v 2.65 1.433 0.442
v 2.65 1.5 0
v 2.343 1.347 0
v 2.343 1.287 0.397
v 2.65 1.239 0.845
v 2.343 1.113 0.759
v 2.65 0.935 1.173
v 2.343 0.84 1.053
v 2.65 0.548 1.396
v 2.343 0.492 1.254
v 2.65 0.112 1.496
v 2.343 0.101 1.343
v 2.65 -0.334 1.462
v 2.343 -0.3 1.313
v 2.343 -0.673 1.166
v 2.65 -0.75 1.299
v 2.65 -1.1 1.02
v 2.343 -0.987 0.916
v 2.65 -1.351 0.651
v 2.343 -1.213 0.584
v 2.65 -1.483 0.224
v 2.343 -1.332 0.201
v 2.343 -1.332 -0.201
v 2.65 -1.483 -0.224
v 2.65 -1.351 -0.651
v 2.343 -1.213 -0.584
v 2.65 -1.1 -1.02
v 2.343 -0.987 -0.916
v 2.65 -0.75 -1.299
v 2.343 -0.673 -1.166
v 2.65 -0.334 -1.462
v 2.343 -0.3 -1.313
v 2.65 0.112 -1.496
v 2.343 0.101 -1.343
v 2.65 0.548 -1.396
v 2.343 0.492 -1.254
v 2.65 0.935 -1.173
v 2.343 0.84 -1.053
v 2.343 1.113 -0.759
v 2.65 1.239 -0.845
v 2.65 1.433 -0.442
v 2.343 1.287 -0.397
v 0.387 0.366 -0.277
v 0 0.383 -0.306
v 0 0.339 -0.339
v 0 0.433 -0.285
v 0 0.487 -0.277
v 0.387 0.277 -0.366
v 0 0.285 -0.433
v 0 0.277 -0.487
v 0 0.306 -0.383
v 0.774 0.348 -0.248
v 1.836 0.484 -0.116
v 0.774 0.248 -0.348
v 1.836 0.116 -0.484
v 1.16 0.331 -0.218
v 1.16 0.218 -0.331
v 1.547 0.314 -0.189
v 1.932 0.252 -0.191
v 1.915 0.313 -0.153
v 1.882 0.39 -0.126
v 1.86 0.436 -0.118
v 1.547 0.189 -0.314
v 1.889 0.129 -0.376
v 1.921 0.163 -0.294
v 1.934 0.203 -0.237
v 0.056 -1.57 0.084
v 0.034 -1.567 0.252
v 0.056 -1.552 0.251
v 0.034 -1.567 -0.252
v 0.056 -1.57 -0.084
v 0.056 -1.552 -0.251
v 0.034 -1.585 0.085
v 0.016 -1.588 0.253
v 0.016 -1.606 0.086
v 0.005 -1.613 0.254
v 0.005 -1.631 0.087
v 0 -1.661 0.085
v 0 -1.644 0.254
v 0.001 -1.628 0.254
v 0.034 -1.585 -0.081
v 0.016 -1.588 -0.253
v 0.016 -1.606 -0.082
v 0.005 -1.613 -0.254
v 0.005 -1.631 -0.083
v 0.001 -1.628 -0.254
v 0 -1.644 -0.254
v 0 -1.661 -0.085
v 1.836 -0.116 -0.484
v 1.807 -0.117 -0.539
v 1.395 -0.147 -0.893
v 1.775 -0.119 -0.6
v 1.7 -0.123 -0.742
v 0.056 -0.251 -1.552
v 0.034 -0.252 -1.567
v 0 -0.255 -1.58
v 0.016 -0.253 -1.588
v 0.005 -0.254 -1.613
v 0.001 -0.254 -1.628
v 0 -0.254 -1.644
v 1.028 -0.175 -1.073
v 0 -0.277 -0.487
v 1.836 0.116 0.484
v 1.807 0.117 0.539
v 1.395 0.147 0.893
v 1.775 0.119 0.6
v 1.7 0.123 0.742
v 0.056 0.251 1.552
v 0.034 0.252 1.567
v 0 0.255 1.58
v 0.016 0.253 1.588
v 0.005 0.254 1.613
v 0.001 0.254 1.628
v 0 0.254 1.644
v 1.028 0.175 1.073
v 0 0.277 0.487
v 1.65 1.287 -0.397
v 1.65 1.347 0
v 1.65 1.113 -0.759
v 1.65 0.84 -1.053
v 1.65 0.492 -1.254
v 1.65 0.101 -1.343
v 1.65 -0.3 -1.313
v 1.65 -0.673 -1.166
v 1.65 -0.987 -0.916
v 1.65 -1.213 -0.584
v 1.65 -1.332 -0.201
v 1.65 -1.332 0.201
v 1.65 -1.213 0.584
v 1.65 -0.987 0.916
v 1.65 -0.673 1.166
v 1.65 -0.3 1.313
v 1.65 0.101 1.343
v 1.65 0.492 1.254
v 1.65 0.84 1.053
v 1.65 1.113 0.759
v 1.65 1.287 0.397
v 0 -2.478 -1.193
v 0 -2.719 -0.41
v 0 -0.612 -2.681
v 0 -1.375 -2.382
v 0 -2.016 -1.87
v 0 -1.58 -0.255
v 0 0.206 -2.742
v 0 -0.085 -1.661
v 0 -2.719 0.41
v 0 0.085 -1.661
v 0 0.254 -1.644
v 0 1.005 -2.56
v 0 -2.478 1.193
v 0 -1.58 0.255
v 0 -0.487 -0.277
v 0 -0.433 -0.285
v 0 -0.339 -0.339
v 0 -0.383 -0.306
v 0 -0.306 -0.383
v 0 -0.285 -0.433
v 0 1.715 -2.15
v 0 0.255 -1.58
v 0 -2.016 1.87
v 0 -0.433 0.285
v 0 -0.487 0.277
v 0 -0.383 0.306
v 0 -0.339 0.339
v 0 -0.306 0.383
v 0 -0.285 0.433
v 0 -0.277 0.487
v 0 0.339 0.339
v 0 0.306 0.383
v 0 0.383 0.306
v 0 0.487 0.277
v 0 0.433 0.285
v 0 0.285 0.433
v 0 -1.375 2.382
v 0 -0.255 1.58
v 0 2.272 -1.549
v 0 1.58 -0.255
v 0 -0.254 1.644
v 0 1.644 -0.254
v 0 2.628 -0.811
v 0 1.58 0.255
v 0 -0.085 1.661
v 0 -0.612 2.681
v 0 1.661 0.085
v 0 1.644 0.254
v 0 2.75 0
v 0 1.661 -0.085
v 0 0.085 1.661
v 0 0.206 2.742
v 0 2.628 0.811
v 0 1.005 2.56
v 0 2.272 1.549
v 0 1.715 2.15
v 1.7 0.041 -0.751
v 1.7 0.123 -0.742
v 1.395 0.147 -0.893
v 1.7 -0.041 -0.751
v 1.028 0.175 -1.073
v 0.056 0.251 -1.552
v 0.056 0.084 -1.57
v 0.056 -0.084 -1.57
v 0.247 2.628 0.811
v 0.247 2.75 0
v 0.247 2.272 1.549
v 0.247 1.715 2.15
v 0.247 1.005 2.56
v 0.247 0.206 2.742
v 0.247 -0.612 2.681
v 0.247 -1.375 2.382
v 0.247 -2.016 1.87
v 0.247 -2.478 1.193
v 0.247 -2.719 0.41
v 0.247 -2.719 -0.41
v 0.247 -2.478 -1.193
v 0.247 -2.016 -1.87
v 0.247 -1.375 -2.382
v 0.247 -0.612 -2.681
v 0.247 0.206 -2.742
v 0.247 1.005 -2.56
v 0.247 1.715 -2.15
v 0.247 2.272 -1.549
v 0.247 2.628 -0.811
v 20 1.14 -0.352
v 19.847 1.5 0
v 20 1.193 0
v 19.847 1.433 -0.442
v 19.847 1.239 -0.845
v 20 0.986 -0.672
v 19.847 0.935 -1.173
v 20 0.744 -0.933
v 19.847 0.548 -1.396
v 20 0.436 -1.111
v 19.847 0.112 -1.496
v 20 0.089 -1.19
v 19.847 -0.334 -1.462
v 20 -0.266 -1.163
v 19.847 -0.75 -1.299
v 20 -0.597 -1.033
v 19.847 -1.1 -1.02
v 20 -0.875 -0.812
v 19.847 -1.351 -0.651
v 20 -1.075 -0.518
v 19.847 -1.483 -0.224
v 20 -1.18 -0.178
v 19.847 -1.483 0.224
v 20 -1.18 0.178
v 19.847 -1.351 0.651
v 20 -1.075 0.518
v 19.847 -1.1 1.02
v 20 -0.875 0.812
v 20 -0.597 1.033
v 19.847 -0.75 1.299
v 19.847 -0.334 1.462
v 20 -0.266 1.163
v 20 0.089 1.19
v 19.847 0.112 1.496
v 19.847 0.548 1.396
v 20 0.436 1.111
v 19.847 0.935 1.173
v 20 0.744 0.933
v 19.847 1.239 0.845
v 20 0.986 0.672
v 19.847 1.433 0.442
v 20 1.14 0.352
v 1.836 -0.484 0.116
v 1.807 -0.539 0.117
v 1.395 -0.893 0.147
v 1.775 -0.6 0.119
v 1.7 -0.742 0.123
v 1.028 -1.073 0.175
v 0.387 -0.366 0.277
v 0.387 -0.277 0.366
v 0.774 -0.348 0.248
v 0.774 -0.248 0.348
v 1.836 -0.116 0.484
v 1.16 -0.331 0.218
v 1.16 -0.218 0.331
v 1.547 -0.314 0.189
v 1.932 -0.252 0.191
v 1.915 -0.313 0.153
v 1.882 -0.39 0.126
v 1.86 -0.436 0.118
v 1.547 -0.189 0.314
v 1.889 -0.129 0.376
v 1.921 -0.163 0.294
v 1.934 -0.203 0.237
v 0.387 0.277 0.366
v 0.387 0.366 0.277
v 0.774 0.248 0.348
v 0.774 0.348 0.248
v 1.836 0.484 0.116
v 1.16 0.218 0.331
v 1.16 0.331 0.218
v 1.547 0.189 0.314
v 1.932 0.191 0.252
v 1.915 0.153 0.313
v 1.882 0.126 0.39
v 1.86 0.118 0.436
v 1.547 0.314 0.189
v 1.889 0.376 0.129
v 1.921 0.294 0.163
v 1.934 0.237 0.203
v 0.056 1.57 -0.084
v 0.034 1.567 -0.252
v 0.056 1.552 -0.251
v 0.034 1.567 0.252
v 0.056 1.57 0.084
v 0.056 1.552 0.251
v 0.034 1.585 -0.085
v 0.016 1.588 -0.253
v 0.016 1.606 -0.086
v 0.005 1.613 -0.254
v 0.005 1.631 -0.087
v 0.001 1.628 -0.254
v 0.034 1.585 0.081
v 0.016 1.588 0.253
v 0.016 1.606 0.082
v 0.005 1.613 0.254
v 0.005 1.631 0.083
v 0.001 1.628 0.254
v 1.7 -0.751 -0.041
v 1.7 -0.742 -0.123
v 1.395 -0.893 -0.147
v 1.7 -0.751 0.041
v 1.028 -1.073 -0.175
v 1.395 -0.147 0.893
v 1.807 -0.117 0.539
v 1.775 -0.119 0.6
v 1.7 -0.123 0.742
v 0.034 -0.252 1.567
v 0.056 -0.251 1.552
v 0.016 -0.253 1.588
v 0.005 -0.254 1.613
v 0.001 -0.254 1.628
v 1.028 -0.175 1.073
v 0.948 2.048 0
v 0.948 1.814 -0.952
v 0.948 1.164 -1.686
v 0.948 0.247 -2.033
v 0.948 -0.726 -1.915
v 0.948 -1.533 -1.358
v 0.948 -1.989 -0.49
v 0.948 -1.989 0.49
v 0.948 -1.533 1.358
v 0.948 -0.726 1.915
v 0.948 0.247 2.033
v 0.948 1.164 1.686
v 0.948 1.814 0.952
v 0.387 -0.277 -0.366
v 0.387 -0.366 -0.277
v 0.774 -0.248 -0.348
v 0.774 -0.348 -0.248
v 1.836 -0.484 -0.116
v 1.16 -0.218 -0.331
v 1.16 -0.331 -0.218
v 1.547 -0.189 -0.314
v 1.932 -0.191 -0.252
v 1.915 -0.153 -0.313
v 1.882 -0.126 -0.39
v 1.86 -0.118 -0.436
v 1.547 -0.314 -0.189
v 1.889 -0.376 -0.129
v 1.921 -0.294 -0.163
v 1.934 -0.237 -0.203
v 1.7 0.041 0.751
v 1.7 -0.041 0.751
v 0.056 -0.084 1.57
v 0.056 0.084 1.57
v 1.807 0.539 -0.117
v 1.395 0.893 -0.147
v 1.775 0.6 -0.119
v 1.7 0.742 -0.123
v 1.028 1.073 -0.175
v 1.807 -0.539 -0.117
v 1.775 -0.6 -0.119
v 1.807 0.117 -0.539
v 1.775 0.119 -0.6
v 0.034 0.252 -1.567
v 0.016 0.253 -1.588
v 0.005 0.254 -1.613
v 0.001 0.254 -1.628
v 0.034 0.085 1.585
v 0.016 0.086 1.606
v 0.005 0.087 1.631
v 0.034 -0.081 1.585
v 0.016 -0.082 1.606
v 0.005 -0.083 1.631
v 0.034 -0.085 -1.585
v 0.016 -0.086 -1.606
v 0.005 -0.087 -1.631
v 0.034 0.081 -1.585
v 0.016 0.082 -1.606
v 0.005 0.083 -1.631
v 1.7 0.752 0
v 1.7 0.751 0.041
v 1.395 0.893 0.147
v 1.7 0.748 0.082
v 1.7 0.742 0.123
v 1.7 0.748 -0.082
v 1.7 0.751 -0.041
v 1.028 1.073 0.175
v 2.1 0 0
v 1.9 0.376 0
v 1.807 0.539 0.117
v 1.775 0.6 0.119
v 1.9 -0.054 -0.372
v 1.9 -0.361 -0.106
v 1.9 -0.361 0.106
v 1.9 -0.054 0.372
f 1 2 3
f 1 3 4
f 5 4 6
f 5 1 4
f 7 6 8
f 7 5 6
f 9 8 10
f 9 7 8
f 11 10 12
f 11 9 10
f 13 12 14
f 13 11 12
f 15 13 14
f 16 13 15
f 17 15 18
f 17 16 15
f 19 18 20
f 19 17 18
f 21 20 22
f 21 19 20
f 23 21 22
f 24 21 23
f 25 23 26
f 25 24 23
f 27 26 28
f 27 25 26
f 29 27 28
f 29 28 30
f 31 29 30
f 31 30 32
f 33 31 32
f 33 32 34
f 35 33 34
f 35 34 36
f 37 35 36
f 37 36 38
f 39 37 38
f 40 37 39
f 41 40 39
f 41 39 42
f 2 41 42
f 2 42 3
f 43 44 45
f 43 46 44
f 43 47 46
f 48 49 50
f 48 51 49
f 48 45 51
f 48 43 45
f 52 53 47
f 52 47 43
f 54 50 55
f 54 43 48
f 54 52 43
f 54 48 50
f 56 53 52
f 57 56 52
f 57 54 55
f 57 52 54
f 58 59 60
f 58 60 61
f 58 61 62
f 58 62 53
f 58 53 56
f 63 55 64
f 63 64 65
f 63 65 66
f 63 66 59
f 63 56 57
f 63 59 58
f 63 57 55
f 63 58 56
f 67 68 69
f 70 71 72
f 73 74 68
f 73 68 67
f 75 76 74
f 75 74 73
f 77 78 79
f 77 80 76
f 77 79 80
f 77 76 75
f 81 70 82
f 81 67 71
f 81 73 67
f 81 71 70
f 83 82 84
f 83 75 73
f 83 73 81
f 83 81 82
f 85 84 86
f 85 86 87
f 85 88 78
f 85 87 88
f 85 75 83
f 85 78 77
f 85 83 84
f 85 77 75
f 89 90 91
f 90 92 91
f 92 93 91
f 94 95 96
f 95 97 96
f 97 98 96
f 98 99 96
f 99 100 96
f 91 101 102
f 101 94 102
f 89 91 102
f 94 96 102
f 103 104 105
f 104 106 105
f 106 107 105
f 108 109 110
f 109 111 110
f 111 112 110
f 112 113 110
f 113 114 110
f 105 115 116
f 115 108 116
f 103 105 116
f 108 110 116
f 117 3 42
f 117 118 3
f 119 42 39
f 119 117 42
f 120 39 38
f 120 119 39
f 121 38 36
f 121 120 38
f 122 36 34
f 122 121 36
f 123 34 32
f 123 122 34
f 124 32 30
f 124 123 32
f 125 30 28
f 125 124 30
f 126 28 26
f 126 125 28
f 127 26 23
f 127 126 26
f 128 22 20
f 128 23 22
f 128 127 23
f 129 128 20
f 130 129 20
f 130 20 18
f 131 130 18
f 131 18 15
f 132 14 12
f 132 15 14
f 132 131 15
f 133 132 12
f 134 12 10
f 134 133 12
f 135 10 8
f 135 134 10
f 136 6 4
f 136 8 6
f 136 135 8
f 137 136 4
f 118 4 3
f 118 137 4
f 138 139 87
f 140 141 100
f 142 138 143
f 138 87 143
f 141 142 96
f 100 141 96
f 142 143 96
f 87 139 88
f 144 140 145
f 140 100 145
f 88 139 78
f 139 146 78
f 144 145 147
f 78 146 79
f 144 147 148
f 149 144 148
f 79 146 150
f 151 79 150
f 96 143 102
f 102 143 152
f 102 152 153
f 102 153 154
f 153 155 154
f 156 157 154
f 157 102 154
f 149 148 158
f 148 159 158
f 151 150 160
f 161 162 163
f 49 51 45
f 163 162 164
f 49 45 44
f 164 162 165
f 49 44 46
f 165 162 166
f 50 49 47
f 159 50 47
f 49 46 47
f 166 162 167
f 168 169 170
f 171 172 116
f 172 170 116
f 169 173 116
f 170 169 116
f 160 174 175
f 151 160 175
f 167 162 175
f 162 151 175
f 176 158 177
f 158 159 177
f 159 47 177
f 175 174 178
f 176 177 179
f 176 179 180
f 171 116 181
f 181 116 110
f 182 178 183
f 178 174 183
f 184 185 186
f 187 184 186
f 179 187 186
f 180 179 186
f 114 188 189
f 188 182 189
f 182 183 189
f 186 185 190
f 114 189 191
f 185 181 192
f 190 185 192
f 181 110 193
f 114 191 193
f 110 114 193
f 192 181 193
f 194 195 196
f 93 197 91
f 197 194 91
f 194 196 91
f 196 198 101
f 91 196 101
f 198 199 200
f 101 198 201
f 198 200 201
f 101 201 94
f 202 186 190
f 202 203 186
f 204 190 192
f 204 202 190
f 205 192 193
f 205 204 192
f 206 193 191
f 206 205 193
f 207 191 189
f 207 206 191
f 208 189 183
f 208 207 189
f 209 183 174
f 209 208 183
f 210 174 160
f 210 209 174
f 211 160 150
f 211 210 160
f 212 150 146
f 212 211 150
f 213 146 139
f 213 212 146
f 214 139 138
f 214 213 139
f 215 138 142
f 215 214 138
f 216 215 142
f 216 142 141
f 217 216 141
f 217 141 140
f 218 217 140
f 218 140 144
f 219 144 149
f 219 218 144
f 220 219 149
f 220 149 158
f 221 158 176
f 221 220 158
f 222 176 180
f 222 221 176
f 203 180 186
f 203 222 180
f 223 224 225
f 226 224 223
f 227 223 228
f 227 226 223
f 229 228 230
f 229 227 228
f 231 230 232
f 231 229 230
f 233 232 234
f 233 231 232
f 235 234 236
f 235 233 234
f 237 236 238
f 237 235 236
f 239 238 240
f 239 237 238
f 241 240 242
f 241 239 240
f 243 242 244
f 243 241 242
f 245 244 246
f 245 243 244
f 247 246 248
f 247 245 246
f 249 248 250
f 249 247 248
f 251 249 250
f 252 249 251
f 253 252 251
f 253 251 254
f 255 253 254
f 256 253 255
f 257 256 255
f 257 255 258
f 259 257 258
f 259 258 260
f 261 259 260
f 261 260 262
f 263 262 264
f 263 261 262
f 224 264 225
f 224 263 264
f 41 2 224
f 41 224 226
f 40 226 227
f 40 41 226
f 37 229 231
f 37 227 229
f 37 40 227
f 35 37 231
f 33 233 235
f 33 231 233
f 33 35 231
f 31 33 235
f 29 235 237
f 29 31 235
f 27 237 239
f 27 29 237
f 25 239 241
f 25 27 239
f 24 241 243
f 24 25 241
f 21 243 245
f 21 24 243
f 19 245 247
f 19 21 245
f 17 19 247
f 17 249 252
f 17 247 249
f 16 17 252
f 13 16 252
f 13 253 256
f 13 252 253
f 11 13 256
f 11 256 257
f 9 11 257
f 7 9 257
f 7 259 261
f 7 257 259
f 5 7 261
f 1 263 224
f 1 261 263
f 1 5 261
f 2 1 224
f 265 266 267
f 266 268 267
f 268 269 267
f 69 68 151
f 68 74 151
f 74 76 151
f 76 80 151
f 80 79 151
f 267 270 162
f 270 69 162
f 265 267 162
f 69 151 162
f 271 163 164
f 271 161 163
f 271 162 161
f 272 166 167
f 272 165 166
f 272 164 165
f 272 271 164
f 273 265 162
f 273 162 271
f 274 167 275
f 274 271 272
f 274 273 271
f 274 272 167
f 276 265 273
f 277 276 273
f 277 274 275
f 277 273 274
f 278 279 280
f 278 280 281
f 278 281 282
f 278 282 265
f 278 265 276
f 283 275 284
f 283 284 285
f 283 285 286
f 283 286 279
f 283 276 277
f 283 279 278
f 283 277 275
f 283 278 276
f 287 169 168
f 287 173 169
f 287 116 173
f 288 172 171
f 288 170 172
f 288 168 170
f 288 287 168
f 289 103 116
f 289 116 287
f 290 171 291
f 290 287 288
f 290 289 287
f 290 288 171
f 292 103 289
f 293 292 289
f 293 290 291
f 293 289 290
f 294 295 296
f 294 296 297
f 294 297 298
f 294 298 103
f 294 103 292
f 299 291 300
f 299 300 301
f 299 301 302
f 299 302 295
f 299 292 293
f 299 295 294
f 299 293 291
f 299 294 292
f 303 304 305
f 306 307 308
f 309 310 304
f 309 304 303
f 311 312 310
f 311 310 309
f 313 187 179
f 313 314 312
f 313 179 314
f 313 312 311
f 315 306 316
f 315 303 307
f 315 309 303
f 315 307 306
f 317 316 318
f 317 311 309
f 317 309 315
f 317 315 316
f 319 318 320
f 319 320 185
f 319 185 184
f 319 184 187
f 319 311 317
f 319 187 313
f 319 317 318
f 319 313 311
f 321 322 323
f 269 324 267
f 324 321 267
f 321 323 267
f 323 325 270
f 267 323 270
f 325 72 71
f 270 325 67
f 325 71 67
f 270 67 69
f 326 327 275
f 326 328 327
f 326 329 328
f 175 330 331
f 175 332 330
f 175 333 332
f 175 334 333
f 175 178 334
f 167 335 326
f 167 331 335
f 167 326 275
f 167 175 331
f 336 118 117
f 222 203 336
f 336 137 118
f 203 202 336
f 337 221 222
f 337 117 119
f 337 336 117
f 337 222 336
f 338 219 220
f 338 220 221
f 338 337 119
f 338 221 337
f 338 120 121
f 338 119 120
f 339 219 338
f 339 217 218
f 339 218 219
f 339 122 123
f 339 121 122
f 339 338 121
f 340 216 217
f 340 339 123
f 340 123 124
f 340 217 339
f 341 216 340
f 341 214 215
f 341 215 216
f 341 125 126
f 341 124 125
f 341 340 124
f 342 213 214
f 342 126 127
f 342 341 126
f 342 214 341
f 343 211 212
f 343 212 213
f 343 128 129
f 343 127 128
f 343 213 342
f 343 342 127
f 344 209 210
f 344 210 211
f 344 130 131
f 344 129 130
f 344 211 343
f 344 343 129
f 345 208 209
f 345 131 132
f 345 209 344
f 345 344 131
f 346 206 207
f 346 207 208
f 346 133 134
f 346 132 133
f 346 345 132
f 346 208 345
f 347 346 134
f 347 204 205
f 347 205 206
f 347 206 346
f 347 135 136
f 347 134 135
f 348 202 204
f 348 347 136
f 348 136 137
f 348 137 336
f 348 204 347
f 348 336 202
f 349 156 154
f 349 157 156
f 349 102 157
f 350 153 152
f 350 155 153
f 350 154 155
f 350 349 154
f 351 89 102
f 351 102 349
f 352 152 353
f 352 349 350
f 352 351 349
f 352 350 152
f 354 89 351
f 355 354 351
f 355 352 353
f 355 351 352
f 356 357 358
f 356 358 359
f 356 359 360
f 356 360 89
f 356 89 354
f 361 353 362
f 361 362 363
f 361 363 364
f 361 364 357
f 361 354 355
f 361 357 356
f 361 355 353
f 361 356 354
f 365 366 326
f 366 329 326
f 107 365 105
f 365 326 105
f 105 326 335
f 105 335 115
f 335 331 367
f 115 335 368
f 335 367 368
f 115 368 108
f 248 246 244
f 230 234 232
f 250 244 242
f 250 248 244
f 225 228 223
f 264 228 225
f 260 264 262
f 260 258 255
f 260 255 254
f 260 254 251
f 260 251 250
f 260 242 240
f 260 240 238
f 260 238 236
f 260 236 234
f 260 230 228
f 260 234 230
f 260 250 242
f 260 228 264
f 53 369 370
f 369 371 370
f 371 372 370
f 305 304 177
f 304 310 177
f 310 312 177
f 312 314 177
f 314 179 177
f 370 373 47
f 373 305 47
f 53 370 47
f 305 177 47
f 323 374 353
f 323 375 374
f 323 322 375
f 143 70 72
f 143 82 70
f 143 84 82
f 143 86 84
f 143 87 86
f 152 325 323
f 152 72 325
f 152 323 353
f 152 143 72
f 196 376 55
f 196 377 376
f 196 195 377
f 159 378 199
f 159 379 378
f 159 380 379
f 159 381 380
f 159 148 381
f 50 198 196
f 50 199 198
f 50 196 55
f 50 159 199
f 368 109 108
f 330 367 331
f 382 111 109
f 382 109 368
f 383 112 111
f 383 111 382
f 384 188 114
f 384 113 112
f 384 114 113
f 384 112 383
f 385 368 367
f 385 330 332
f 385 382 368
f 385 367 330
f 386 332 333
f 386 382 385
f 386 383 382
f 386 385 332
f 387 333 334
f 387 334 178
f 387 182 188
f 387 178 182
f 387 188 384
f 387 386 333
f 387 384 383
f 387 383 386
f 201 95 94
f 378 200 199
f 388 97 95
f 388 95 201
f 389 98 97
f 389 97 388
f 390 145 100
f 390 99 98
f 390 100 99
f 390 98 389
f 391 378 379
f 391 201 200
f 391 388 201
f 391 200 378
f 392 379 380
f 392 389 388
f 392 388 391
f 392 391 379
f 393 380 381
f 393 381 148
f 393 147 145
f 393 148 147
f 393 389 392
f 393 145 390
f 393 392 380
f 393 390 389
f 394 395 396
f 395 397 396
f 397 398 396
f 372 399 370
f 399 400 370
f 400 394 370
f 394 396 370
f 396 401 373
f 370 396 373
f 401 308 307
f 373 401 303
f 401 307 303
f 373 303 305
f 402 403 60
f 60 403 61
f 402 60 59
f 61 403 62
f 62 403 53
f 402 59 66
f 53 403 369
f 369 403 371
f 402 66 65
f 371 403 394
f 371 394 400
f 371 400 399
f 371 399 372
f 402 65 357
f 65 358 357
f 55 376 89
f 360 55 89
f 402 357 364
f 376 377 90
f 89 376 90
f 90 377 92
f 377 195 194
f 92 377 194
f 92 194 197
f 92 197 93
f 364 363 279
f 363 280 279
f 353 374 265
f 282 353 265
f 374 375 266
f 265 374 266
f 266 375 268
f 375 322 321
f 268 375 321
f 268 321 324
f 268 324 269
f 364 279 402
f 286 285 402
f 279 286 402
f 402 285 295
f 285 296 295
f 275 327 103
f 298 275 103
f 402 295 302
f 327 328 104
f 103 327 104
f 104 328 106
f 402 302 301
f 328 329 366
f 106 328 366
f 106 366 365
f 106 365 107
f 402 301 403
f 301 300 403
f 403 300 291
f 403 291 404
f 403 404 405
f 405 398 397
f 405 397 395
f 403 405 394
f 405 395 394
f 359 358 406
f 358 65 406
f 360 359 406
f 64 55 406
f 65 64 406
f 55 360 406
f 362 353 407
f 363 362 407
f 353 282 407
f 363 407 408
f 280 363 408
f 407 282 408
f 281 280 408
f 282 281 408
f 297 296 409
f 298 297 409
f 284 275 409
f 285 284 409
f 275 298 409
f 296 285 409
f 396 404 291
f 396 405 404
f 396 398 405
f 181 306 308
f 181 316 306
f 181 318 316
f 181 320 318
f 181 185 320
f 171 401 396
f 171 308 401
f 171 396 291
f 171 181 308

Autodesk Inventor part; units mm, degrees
ref_plane "YZ Plane" through (0, 0, 0) normal (1, 0, 0) x (0, 1, 0)
ref_plane "XZ Plane" through (0, 0, 0) normal (0, 1, 0) x (-1, 0, 0)
sketch "Эскиз1" plane through (0, 0, 0) normal (0, 0, 1) x (1, 0, 0)
  line L0 (2.1, 0) -> (20, 0)
  line L1 (20, 0) -> (20, 1.5)
  line L2 (20, 1.5) -> (2.65, 1.5)
  line L3 (2.65, 1.5) -> (2.3433, 1.3466)
  line L4 (2.3433, 1.3466) -> (1.65, 1.3466)
  line L5 (0, 2.75) -> (0, 1.6)
  line L6 (0, 1.6) -> (1.6999, 0.7525)
  line L7 (1.6999, 0.7525) -> (2.1, 0)
  line L8 (-4, 0) -> (24, 0) projected
  line L9 (0, -0.55) -> (0, 3.3) projected
  line L10 (0, 2.75) -> (0.2466, 2.75)
  line L11 (0.2466, 2.75) -> (1.65, 1.3466)
  line L12 (2.65, 1.5) -> (1.4966, 1.5) construction
  dimension "d1" = 17.35
  dimension "d2" = 3
  dimension "d3" = 2.6933
  dimension "d4" = 3.2
  dimension "d5" = 26.5
  dimension "d6" = 62
  dimension "d7" = 2.1
  dimension "d8" = 0.3067
  dimension "d12" = 5.5
  dimension "d13" = 45
  dimension "d15" = 20
  dimension "d24" = 1.65
revolve "Базовый элемент" add sketch "Эскиз1" angle 360 about axis through (2.1, 0, 0) along (1, 0, 0) contours L7 L6 L5 L10 L11 L4 L3 L2 L1 L0
sketch "Эскиз2" plane through (0, 0, 0) normal (-1, 0, 0) x (0, 0, 1)
  line L0 (0, 1.6) -> (0, 0) construction
  line L1 (0, 0) -> (1.6, 0) construction
  arc A0 (0.48, 0) -> (0, 0.48) centre (0, 0) ccw construction
  arc A1 (0.56, 0) -> (0, 0.56) centre (0, 0) ccw construction
  arc A2 (1.5795, 0.255) -> (0.255, 1.5795) centre (0, 0) ccw
  line L2 (0, 0) -> (1.1314, 1.1314) construction
  line L3 (0.255, 1.5795) -> (0.2766, 0.4869)
  line L4 (1.5795, 0.255) -> (0.4869, 0.2766)
  arc A3 (0.255, 1.5795) -> (0, 1.6) centre (0, 0) ccw
  arc A4 (1.6, 0) -> (1.5795, 0.255) centre (0, 0) ccw
  line L5 (0, -3.85) -> (0, 3.85) projected
  line L6 (-3.85, 0) -> (3.85, 0) projected
  arc A5 (0.255, -1.5795) -> (1.5795, -0.255) centre (0, 0) ccw
  line L7 (0.255, -1.5795) -> (0.2766, -0.4869)
  line L8 (1.5795, -0.255) -> (0.4869, -0.2766)
  arc A6 (0, -1.6) -> (0.255, -1.5795) centre (0, 0) ccw
  arc A7 (1.5795, -0.255) -> (1.6, 0) centre (0, 0) ccw
  arc A8 (-0.255, 1.5795) -> (-1.5795, 0.255) centre (0, 0) ccw
  line L9 (-0.255, 1.5795) -> (-0.2766, 0.4869)
  line L10 (-1.5795, 0.255) -> (-0.4869, 0.2766)
  arc A9 (0, 1.6) -> (-0.255, 1.5795) centre (0, 0) ccw
  arc A10 (-1.5795, 0.255) -> (-1.6, 0) centre (0, 0) ccw
  arc A11 (-0.255, -1.5795) -> (0, -1.6) centre (0, 0) ccw
  arc A12 (-1.5795, -0.255) -> (-0.255, -1.5795) centre (0, 0) ccw
  arc A13 (-1.6, 0) -> (-1.5795, -0.255) centre (0, 0) ccw
  line L11 (-1.5795, -0.255) -> (-0.4869, -0.2766)
  line L12 (-0.255, -1.5795) -> (-0.2766, -0.4869)
  arc A14 (0.2766, 0.4869) -> (0.4869, 0.2766) centre (0.4912, 0.4912) ccw
  arc A15 (0.4869, -0.2766) -> (0.2766, -0.4869) centre (0.4912, -0.4912) ccw
  arc A16 (-0.4869, 0.2766) -> (-0.2766, 0.4869) centre (-0.4912, 0.4912) ccw
  arc A17 (-0.2766, -0.4869) -> (-0.4869, -0.2766) centre (-0.4912, -0.4912) ccw
  point P0 (1.1314, -1.1314)
  point P1 (-1.1314, 1.1314)
  point P2 (-1.1314, -1.1314)
  dimension "d17" = 0.96
  dimension "d18" = 1.12
  dimension "d19" = 3.2
  dimension "d20" = 45
  dimension "d21" = 0.255
extrude "Паз" add sketch "Эскиз2" against normal up to next draft 5 contours L4 A14 L3 A2 | A5 L7 A15 L8 | L9 A16 L10 A8 | A12 L11 A17 L12
fillet "Сопряжение1" radius 0.102 4 edges at (0, 1.6, 0) (0, 0, -1.6) (0, -1.6, 0) (0, 0, 1.6)
thread "Резьба" size "M3x0.5" class "6g" standard "ISO Metric profile" length 17.35
chamfer "Фаска1" distance 0.3067 distance2 0.1534 1 edges at (20, -1.5, 0) measured on face at (20, 0.1367, 0.3027)
ref_plane "Work Plane2" through (3.35, 0, 0) normal (0, 0, -1) x (1, 0, 0)
equation "\"d1\" = GEL"
equation "\"d2\" = GD"
equation "\"d3\" = BDM"
equation "\"d4\" = SDM"
equation "\"d7\" = INTI"
equation "\"d8\" = GAL"
equation "\"d12\" = KOD"
equation "\"d13\" = 0.5 * SEWI"
equation "\"d15\" = NLG"
equation "\"d24\" = KOH"
equation "\"d17\" = 0.3 * SDM"
equation "\"d18\" = 0.35 * SDM"
equation "\"d19\" = SDM"
equation "\"d21\" = 0.5 * SBR"
equation "\"d23\" = 0.2 * SBR"
equation "\"d10\" = GEL"
equation "\"d25\" = -0.5 * SPD + 0.5 * GD"
equation "\"d26\" = 0.5 * GAL"
equation "\"NLG\" = 20"
equation "\"GEL\" = 17.35"
equation "\"GAL\" = 0.61345 * PTC"
equation "\"SPD\" = NND - 1.2269 * PTC"
equation "\"KOD\" = 5.5"
equation "\"KOH\" = 1.65"
equation "\"SBR\" = 0.51"
equation "\"INTI\" = 2.1"
equation "\"SDM\" = 3.2"
equation "\"GD\" = NND"
equation "\"BDM\" = NND - GAL"
equation "\"SEWI\" = 90deg"
equation "\"d9\" = SDM"
equation "\"GUL\" = 0.61345 * PTC"
equation "\"TOA\" = 30deg"
equation "\"EPV\" = 3.15"
equation "\"THREADDIA\" = 3"
equation "\"PTC\" = 0.5"
equation "\"NND\" = 3"
equation "\"GD1\" = THREADDIA - 1.2269 * PTC"
properties part number "ISO 7046-1 - M3 x 20 - 4.8 - H" material "Сталь"
